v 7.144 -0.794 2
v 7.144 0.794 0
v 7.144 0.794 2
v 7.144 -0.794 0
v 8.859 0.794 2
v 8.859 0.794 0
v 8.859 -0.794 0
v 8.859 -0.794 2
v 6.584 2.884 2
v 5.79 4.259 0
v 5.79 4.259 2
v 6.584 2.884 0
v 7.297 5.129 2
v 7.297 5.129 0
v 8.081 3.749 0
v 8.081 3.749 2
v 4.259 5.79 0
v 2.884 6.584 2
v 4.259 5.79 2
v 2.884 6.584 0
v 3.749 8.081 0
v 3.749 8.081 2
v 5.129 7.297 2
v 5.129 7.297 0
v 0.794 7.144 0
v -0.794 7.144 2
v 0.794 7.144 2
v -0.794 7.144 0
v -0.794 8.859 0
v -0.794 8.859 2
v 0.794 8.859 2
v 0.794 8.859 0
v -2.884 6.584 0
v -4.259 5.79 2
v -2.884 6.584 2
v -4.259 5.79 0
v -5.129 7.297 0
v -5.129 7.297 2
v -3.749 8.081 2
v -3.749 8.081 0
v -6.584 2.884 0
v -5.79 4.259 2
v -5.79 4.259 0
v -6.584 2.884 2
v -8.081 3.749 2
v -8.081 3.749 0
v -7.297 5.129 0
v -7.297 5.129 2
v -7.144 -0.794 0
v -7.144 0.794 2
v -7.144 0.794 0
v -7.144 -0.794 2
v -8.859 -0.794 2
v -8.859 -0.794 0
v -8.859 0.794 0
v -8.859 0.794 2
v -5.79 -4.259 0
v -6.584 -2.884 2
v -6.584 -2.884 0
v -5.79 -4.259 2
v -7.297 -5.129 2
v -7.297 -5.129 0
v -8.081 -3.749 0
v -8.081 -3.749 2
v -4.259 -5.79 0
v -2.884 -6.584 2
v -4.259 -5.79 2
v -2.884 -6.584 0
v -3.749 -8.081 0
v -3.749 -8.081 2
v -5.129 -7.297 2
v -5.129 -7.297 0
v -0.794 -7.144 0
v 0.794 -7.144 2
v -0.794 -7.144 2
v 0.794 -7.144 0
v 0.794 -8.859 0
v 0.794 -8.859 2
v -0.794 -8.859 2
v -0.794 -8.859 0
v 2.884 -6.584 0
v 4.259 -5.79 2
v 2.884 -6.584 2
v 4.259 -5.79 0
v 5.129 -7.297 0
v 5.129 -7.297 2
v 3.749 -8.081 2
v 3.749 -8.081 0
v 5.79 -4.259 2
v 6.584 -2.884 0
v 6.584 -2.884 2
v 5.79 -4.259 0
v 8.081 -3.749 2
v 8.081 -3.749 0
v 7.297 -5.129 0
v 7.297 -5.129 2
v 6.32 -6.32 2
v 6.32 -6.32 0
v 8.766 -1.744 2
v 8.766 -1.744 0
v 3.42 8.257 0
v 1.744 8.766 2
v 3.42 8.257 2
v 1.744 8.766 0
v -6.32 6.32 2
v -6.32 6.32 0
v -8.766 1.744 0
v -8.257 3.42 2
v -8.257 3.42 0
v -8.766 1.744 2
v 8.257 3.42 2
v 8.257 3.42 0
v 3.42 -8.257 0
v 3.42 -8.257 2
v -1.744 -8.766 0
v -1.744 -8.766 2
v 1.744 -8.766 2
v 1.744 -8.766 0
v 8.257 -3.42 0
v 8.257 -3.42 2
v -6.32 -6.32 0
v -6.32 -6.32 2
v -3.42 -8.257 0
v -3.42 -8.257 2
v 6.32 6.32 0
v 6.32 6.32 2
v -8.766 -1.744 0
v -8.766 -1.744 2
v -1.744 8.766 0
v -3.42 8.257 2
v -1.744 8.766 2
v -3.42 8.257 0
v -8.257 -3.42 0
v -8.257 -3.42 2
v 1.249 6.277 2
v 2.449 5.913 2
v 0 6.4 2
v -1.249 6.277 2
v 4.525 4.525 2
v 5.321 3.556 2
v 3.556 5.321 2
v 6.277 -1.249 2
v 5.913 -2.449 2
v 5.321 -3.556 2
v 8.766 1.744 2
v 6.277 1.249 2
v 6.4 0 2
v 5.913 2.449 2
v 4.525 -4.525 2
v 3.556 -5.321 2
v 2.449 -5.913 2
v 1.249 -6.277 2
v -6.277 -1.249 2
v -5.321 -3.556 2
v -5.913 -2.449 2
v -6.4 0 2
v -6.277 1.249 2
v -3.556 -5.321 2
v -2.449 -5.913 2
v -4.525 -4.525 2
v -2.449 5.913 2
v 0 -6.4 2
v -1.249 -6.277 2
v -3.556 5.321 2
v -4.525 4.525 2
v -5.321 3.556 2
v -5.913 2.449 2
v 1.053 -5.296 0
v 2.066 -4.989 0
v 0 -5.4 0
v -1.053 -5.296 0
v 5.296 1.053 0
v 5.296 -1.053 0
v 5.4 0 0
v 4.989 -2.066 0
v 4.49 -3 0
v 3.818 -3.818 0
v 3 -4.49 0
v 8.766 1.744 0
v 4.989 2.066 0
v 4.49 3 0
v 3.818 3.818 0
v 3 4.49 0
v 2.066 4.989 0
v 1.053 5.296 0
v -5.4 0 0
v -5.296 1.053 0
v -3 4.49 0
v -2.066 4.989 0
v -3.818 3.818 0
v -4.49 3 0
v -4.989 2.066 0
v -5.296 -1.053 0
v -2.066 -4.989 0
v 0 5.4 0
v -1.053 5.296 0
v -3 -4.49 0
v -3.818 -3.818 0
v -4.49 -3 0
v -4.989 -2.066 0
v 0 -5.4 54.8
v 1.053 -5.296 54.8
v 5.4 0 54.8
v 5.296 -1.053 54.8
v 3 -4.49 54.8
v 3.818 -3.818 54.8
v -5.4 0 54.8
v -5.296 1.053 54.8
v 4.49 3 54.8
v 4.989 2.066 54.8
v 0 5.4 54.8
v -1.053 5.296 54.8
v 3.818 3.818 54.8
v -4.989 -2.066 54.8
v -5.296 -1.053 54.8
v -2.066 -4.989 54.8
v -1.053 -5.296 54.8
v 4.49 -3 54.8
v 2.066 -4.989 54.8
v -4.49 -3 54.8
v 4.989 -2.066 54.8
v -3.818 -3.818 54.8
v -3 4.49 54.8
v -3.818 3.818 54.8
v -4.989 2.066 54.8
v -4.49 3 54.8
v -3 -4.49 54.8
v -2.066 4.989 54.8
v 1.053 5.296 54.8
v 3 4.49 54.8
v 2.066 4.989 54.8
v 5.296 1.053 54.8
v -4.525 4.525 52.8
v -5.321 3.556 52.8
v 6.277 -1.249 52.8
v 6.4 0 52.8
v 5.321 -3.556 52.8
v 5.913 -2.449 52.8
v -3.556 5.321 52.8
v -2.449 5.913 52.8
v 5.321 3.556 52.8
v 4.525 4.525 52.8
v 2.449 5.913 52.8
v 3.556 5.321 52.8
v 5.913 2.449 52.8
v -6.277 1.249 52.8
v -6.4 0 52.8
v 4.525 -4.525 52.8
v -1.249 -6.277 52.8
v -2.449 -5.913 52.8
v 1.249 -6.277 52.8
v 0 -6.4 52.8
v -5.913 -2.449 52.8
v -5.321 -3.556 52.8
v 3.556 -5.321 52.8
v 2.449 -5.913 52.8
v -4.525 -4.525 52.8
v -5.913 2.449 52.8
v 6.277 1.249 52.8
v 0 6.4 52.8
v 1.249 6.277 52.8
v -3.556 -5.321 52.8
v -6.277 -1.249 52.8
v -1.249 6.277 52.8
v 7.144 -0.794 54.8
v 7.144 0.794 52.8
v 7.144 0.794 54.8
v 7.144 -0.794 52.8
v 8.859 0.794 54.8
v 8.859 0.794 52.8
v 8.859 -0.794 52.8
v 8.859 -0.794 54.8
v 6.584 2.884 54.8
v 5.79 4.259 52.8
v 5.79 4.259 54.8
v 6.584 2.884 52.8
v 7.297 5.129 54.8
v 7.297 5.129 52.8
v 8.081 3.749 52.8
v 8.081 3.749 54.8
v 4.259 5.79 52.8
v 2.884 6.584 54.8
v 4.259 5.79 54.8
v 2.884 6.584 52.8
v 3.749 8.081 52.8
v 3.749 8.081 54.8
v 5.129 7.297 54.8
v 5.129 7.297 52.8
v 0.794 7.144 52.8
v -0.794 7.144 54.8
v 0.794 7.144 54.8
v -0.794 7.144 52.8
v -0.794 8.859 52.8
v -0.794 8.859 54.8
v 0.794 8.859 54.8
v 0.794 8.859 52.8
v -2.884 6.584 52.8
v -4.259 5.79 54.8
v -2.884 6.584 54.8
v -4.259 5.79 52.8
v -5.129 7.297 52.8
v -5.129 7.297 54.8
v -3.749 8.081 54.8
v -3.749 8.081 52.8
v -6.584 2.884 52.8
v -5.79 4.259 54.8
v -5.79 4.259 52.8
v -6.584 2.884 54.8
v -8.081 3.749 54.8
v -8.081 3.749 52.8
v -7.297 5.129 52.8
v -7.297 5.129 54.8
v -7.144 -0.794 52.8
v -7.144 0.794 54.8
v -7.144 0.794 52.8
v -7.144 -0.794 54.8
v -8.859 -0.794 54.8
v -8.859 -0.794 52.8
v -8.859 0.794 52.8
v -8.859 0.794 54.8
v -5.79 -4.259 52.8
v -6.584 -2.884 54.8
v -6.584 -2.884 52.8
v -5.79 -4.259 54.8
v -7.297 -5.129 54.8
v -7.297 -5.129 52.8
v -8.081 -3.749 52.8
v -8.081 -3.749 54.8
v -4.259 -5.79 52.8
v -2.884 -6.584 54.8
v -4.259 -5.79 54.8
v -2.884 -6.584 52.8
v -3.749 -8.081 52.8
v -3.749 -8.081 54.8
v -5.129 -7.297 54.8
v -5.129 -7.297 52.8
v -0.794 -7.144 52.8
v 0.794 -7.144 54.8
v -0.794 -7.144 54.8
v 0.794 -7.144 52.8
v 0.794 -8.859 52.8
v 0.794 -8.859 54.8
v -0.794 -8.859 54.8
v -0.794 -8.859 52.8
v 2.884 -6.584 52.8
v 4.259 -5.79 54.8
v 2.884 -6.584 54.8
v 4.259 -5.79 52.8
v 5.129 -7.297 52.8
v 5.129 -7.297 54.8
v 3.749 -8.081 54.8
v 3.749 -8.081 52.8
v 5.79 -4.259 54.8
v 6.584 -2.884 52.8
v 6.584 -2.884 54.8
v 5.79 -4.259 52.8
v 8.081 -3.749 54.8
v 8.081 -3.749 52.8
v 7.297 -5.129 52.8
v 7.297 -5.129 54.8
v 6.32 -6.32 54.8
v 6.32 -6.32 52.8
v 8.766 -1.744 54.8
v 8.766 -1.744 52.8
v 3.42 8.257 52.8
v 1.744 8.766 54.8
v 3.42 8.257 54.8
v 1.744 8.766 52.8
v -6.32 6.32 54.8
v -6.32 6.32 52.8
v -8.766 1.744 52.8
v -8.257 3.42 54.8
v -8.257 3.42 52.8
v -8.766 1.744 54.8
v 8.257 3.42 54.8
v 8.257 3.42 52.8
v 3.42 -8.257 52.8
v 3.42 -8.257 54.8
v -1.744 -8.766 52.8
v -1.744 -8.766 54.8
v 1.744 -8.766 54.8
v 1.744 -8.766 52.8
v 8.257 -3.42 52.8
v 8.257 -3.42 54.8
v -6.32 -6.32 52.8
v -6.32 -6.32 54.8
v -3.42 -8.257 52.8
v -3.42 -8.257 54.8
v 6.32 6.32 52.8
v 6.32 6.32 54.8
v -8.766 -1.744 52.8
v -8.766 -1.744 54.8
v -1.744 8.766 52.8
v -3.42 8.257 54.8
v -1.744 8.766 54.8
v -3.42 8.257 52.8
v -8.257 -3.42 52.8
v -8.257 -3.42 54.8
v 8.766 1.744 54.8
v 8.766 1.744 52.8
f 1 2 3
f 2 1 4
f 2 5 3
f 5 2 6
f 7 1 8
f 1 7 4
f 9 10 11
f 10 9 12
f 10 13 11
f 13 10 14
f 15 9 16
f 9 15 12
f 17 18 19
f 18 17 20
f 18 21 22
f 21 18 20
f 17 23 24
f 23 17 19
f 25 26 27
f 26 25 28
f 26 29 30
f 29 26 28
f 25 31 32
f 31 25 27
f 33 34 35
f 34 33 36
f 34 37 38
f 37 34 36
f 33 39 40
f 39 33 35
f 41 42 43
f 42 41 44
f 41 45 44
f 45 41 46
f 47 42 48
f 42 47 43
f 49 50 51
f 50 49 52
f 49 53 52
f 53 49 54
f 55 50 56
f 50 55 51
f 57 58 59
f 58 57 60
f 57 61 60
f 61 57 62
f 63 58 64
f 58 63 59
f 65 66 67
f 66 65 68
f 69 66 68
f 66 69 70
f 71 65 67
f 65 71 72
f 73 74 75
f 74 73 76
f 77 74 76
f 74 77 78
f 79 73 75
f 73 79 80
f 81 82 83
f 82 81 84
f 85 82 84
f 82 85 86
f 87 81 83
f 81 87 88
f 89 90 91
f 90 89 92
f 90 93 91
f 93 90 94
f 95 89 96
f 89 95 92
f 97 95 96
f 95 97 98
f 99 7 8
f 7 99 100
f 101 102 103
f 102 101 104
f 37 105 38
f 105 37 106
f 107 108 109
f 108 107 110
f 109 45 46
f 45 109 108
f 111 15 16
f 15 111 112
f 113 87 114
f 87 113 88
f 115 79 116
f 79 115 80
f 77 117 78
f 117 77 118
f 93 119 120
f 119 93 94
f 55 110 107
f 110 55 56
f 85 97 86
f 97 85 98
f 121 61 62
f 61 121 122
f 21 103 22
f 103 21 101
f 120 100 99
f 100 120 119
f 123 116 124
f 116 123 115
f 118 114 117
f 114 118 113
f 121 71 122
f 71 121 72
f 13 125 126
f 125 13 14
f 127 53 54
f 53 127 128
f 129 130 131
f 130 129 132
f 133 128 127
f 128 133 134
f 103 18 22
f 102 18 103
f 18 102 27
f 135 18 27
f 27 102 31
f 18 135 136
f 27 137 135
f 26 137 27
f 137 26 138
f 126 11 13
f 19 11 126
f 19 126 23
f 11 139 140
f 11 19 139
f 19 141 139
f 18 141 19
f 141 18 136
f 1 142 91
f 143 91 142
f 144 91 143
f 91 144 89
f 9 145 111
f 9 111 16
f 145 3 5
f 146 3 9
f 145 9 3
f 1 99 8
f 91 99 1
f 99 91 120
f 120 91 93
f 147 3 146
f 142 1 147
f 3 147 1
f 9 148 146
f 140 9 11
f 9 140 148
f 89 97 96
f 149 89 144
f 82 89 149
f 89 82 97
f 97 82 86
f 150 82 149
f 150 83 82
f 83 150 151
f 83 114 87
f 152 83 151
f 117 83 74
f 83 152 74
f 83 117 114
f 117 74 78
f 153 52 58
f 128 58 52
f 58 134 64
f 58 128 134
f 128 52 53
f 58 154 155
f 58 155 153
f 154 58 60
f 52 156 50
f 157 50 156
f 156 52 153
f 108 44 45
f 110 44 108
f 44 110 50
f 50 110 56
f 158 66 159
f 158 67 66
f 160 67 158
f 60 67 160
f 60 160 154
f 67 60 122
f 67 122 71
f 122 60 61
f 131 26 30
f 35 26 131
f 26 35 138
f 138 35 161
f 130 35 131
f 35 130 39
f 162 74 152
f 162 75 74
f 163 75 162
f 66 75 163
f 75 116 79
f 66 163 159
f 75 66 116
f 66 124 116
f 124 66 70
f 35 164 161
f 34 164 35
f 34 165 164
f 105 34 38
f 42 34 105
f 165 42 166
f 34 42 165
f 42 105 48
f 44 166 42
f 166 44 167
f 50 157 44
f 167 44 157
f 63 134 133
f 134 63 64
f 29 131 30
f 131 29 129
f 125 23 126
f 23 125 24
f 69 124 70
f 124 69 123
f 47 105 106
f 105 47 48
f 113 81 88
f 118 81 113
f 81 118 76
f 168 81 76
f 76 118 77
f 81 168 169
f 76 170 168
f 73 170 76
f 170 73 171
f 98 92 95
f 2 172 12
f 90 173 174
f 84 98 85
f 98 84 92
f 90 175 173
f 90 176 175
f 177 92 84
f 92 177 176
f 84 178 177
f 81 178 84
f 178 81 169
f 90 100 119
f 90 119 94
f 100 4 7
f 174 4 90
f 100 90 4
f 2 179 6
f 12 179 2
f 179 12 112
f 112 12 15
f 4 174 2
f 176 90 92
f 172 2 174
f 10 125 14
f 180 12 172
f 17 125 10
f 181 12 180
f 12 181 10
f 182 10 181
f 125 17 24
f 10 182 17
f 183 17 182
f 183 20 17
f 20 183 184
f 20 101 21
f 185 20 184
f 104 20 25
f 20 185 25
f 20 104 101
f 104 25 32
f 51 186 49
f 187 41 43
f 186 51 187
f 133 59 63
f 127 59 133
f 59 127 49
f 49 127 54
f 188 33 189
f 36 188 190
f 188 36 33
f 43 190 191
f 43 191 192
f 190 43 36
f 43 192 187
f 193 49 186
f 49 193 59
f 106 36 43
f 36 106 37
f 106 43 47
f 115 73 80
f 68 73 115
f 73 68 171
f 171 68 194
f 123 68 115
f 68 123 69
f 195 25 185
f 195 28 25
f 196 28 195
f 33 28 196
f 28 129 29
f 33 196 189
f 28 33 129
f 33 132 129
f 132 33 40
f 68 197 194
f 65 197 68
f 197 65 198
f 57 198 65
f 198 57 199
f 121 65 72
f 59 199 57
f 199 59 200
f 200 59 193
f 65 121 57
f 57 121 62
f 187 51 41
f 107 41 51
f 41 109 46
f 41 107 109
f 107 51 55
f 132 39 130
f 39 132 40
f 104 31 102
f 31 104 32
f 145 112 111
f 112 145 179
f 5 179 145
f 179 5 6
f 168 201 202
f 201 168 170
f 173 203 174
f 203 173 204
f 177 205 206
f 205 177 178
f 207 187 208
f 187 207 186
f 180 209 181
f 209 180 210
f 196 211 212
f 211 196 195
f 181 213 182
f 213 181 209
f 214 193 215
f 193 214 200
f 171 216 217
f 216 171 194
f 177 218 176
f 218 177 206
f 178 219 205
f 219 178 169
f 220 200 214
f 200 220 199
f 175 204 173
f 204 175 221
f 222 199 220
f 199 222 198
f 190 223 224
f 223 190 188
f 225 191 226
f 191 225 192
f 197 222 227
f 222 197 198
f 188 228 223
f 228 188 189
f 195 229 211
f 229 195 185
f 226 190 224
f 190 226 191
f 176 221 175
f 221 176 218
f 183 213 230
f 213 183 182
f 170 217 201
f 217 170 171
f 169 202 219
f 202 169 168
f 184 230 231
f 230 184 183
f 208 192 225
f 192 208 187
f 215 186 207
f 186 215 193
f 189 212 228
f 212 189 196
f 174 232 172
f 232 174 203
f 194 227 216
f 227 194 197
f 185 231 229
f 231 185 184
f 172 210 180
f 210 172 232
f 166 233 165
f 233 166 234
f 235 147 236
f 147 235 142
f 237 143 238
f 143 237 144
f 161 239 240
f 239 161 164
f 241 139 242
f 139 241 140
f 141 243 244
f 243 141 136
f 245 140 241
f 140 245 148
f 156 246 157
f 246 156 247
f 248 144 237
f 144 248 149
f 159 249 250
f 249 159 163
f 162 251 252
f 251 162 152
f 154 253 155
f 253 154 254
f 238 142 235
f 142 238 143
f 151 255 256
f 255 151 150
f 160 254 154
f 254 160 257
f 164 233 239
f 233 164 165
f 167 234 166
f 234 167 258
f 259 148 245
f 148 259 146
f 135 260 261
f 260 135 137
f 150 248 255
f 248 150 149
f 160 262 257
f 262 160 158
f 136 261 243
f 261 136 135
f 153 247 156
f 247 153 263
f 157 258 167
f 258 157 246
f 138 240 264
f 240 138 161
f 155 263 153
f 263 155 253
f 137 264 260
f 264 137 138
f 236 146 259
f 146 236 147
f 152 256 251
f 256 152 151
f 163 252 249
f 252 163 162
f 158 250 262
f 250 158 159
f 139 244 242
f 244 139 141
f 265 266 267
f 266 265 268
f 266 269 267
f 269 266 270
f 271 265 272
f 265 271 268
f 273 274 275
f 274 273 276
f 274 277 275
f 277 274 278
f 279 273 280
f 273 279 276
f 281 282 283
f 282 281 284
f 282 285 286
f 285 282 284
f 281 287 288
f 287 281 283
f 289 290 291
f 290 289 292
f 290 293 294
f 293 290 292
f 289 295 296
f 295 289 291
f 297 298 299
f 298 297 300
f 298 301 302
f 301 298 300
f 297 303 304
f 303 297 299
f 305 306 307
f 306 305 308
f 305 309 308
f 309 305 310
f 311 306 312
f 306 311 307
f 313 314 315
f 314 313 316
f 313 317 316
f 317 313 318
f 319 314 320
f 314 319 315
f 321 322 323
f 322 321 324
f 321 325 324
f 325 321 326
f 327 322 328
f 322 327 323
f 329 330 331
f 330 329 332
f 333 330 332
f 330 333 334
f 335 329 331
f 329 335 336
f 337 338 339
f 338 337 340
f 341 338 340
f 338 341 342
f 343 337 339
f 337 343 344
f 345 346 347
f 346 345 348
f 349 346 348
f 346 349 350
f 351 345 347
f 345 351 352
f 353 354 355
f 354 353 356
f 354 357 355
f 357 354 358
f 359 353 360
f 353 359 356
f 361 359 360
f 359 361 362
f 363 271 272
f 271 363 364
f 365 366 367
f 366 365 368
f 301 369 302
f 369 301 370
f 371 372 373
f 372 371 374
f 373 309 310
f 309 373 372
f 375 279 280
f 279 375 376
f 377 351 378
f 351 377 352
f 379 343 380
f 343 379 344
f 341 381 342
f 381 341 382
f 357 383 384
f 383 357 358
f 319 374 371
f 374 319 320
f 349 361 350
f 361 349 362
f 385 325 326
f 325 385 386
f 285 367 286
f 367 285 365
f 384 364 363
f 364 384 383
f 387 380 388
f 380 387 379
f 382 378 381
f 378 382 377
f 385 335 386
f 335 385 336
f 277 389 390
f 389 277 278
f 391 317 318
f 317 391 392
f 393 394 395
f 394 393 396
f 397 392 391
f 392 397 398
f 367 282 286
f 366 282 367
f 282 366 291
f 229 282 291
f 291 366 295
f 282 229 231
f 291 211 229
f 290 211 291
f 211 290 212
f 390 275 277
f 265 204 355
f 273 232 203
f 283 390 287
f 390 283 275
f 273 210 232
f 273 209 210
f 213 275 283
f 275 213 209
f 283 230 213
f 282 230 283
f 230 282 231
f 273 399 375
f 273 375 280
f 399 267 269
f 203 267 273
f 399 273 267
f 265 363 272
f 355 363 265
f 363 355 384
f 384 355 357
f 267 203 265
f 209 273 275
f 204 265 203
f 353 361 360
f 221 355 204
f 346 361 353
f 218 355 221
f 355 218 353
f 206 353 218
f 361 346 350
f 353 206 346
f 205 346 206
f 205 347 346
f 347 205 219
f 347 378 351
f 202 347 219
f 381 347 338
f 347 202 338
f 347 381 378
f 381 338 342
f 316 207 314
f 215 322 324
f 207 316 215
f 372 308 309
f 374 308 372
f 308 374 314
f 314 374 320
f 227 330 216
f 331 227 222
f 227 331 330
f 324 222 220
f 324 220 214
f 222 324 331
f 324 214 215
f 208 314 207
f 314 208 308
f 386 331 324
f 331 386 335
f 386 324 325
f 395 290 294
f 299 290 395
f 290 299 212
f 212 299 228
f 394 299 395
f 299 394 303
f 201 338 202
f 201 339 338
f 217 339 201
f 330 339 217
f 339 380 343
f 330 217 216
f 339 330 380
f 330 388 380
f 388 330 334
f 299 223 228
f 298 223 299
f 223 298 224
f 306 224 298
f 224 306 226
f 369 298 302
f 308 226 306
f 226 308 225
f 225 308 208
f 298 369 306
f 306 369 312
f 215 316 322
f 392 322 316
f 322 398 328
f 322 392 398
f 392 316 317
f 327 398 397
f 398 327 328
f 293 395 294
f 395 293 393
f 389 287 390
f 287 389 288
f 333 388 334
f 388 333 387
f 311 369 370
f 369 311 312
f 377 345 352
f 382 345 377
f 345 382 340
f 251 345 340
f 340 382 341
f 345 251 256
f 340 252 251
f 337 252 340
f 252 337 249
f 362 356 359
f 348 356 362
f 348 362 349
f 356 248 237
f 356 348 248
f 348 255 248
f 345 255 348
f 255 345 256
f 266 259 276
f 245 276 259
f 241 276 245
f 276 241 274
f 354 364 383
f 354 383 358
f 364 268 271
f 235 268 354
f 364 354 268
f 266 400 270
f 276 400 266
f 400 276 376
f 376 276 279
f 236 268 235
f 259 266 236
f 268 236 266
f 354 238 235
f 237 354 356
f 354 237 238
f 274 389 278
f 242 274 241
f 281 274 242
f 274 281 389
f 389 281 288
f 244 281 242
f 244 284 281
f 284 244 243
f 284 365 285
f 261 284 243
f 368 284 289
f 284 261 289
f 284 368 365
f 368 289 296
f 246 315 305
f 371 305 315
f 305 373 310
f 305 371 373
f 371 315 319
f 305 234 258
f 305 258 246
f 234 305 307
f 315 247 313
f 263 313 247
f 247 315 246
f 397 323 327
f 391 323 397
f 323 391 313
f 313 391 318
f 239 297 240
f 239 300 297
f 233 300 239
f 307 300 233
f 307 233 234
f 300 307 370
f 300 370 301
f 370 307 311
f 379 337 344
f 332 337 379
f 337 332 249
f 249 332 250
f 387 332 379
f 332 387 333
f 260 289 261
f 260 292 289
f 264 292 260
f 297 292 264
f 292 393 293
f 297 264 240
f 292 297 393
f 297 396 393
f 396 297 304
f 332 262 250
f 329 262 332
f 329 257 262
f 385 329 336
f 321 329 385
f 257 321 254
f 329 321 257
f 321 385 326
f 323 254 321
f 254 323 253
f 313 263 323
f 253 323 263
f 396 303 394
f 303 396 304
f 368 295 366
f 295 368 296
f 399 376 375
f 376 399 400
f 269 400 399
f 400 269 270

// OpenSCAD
// coil form
//
// ref:  62 turns, single layer, 28g
//       20uH without core
//       160uH with ferrite core (10mm x ~25mm)
// Ideal:  turns ratio T = 1.5uH/turn for ~100uH
//         at center of adjustment range
//         which is +50%,-80%
//
// 3 layer coil would be appx 800uH
//

function scaler(n) = n * 0.254 * 1.02;
  // convert 1/100 inch to millimeters
  // with 1.02 shrink factor
function anti_scaler(n) = (n / 0.254) / 1.02;


$sd = 10.8; // 10mm slug diameter plus clearance
$sl = 50.8; // 50.8mm (2 inch) slug length
$th = 2;    // 2mm wall thickness
$bh = 4;    // 4mm base height

$nn = 25.4 / 16; // 1/16 inch notches
$bw = 25.4 / 2 + $nn;  // 1/2 inch square base for mount holes (add twice notch size for actual base size)
$dr = $nn; // 1/16 drill radius for mount hole


// yoke/canopy dimensions
// This design assumes inner diameter at least twice
// that of the diameter for the adjustment screw
//
// adjust screw:  4-40 1.5 inch nylong screw, 2 nuts, glued in place on yoke
//                (additional nut glued to top of core?)

$xd = 25.4 / 8 + 0.3; // diameter for adjust screw hole
$xc = 25.4 / 4; // clearance above tube for adjust thingy
$xw = 25.4 / 4; // width of adjust thingy
$xh = 2;        // thickness of adjust thingy


$fn=32; // num frames in shape (global)


color("red") // base
    difference()
    {
      linear_extrude(height=$th)
        circle(d=$bw+$th+$nn);

      translate([0,0,-1])
        linear_extrude(height=$th+2)
          circle(d=$sd);

      for(ww=[0:30:359])
      {
        rotate([0,0,ww])
          translate([$bw/2 + $nn, 0, -1]) // notches
            linear_extrude(height=$bh + 2)
              square([2*$nn,$nn], center=true);
      }
        
    }

color("orange")
  translate([0,0,$th-1])
    difference()
    {
      linear_extrude(height=$sl+2)
        circle(d=$sd+$th);

      translate([0,0,-1])
        linear_extrude(height=$sl+4)
          circle(d=$sd);
    }

color("red")   // tie off for wires
  translate([0,0,$sl+$th])
    difference()
    {
      linear_extrude(height=$th)
        circle(d=$bw+$th+$nn);

      translate([0,0,-1])
        linear_extrude(height=$th+2)
          circle(d=$sd);

      for(ww=[0:30:359])
      {
        rotate([0,0,ww])
          translate([$bw/2 + $nn, 0, -1]) // notches
            linear_extrude(height=$bh + 2)
              square([2*$nn,$nn], center=true);
      }
        
    }
